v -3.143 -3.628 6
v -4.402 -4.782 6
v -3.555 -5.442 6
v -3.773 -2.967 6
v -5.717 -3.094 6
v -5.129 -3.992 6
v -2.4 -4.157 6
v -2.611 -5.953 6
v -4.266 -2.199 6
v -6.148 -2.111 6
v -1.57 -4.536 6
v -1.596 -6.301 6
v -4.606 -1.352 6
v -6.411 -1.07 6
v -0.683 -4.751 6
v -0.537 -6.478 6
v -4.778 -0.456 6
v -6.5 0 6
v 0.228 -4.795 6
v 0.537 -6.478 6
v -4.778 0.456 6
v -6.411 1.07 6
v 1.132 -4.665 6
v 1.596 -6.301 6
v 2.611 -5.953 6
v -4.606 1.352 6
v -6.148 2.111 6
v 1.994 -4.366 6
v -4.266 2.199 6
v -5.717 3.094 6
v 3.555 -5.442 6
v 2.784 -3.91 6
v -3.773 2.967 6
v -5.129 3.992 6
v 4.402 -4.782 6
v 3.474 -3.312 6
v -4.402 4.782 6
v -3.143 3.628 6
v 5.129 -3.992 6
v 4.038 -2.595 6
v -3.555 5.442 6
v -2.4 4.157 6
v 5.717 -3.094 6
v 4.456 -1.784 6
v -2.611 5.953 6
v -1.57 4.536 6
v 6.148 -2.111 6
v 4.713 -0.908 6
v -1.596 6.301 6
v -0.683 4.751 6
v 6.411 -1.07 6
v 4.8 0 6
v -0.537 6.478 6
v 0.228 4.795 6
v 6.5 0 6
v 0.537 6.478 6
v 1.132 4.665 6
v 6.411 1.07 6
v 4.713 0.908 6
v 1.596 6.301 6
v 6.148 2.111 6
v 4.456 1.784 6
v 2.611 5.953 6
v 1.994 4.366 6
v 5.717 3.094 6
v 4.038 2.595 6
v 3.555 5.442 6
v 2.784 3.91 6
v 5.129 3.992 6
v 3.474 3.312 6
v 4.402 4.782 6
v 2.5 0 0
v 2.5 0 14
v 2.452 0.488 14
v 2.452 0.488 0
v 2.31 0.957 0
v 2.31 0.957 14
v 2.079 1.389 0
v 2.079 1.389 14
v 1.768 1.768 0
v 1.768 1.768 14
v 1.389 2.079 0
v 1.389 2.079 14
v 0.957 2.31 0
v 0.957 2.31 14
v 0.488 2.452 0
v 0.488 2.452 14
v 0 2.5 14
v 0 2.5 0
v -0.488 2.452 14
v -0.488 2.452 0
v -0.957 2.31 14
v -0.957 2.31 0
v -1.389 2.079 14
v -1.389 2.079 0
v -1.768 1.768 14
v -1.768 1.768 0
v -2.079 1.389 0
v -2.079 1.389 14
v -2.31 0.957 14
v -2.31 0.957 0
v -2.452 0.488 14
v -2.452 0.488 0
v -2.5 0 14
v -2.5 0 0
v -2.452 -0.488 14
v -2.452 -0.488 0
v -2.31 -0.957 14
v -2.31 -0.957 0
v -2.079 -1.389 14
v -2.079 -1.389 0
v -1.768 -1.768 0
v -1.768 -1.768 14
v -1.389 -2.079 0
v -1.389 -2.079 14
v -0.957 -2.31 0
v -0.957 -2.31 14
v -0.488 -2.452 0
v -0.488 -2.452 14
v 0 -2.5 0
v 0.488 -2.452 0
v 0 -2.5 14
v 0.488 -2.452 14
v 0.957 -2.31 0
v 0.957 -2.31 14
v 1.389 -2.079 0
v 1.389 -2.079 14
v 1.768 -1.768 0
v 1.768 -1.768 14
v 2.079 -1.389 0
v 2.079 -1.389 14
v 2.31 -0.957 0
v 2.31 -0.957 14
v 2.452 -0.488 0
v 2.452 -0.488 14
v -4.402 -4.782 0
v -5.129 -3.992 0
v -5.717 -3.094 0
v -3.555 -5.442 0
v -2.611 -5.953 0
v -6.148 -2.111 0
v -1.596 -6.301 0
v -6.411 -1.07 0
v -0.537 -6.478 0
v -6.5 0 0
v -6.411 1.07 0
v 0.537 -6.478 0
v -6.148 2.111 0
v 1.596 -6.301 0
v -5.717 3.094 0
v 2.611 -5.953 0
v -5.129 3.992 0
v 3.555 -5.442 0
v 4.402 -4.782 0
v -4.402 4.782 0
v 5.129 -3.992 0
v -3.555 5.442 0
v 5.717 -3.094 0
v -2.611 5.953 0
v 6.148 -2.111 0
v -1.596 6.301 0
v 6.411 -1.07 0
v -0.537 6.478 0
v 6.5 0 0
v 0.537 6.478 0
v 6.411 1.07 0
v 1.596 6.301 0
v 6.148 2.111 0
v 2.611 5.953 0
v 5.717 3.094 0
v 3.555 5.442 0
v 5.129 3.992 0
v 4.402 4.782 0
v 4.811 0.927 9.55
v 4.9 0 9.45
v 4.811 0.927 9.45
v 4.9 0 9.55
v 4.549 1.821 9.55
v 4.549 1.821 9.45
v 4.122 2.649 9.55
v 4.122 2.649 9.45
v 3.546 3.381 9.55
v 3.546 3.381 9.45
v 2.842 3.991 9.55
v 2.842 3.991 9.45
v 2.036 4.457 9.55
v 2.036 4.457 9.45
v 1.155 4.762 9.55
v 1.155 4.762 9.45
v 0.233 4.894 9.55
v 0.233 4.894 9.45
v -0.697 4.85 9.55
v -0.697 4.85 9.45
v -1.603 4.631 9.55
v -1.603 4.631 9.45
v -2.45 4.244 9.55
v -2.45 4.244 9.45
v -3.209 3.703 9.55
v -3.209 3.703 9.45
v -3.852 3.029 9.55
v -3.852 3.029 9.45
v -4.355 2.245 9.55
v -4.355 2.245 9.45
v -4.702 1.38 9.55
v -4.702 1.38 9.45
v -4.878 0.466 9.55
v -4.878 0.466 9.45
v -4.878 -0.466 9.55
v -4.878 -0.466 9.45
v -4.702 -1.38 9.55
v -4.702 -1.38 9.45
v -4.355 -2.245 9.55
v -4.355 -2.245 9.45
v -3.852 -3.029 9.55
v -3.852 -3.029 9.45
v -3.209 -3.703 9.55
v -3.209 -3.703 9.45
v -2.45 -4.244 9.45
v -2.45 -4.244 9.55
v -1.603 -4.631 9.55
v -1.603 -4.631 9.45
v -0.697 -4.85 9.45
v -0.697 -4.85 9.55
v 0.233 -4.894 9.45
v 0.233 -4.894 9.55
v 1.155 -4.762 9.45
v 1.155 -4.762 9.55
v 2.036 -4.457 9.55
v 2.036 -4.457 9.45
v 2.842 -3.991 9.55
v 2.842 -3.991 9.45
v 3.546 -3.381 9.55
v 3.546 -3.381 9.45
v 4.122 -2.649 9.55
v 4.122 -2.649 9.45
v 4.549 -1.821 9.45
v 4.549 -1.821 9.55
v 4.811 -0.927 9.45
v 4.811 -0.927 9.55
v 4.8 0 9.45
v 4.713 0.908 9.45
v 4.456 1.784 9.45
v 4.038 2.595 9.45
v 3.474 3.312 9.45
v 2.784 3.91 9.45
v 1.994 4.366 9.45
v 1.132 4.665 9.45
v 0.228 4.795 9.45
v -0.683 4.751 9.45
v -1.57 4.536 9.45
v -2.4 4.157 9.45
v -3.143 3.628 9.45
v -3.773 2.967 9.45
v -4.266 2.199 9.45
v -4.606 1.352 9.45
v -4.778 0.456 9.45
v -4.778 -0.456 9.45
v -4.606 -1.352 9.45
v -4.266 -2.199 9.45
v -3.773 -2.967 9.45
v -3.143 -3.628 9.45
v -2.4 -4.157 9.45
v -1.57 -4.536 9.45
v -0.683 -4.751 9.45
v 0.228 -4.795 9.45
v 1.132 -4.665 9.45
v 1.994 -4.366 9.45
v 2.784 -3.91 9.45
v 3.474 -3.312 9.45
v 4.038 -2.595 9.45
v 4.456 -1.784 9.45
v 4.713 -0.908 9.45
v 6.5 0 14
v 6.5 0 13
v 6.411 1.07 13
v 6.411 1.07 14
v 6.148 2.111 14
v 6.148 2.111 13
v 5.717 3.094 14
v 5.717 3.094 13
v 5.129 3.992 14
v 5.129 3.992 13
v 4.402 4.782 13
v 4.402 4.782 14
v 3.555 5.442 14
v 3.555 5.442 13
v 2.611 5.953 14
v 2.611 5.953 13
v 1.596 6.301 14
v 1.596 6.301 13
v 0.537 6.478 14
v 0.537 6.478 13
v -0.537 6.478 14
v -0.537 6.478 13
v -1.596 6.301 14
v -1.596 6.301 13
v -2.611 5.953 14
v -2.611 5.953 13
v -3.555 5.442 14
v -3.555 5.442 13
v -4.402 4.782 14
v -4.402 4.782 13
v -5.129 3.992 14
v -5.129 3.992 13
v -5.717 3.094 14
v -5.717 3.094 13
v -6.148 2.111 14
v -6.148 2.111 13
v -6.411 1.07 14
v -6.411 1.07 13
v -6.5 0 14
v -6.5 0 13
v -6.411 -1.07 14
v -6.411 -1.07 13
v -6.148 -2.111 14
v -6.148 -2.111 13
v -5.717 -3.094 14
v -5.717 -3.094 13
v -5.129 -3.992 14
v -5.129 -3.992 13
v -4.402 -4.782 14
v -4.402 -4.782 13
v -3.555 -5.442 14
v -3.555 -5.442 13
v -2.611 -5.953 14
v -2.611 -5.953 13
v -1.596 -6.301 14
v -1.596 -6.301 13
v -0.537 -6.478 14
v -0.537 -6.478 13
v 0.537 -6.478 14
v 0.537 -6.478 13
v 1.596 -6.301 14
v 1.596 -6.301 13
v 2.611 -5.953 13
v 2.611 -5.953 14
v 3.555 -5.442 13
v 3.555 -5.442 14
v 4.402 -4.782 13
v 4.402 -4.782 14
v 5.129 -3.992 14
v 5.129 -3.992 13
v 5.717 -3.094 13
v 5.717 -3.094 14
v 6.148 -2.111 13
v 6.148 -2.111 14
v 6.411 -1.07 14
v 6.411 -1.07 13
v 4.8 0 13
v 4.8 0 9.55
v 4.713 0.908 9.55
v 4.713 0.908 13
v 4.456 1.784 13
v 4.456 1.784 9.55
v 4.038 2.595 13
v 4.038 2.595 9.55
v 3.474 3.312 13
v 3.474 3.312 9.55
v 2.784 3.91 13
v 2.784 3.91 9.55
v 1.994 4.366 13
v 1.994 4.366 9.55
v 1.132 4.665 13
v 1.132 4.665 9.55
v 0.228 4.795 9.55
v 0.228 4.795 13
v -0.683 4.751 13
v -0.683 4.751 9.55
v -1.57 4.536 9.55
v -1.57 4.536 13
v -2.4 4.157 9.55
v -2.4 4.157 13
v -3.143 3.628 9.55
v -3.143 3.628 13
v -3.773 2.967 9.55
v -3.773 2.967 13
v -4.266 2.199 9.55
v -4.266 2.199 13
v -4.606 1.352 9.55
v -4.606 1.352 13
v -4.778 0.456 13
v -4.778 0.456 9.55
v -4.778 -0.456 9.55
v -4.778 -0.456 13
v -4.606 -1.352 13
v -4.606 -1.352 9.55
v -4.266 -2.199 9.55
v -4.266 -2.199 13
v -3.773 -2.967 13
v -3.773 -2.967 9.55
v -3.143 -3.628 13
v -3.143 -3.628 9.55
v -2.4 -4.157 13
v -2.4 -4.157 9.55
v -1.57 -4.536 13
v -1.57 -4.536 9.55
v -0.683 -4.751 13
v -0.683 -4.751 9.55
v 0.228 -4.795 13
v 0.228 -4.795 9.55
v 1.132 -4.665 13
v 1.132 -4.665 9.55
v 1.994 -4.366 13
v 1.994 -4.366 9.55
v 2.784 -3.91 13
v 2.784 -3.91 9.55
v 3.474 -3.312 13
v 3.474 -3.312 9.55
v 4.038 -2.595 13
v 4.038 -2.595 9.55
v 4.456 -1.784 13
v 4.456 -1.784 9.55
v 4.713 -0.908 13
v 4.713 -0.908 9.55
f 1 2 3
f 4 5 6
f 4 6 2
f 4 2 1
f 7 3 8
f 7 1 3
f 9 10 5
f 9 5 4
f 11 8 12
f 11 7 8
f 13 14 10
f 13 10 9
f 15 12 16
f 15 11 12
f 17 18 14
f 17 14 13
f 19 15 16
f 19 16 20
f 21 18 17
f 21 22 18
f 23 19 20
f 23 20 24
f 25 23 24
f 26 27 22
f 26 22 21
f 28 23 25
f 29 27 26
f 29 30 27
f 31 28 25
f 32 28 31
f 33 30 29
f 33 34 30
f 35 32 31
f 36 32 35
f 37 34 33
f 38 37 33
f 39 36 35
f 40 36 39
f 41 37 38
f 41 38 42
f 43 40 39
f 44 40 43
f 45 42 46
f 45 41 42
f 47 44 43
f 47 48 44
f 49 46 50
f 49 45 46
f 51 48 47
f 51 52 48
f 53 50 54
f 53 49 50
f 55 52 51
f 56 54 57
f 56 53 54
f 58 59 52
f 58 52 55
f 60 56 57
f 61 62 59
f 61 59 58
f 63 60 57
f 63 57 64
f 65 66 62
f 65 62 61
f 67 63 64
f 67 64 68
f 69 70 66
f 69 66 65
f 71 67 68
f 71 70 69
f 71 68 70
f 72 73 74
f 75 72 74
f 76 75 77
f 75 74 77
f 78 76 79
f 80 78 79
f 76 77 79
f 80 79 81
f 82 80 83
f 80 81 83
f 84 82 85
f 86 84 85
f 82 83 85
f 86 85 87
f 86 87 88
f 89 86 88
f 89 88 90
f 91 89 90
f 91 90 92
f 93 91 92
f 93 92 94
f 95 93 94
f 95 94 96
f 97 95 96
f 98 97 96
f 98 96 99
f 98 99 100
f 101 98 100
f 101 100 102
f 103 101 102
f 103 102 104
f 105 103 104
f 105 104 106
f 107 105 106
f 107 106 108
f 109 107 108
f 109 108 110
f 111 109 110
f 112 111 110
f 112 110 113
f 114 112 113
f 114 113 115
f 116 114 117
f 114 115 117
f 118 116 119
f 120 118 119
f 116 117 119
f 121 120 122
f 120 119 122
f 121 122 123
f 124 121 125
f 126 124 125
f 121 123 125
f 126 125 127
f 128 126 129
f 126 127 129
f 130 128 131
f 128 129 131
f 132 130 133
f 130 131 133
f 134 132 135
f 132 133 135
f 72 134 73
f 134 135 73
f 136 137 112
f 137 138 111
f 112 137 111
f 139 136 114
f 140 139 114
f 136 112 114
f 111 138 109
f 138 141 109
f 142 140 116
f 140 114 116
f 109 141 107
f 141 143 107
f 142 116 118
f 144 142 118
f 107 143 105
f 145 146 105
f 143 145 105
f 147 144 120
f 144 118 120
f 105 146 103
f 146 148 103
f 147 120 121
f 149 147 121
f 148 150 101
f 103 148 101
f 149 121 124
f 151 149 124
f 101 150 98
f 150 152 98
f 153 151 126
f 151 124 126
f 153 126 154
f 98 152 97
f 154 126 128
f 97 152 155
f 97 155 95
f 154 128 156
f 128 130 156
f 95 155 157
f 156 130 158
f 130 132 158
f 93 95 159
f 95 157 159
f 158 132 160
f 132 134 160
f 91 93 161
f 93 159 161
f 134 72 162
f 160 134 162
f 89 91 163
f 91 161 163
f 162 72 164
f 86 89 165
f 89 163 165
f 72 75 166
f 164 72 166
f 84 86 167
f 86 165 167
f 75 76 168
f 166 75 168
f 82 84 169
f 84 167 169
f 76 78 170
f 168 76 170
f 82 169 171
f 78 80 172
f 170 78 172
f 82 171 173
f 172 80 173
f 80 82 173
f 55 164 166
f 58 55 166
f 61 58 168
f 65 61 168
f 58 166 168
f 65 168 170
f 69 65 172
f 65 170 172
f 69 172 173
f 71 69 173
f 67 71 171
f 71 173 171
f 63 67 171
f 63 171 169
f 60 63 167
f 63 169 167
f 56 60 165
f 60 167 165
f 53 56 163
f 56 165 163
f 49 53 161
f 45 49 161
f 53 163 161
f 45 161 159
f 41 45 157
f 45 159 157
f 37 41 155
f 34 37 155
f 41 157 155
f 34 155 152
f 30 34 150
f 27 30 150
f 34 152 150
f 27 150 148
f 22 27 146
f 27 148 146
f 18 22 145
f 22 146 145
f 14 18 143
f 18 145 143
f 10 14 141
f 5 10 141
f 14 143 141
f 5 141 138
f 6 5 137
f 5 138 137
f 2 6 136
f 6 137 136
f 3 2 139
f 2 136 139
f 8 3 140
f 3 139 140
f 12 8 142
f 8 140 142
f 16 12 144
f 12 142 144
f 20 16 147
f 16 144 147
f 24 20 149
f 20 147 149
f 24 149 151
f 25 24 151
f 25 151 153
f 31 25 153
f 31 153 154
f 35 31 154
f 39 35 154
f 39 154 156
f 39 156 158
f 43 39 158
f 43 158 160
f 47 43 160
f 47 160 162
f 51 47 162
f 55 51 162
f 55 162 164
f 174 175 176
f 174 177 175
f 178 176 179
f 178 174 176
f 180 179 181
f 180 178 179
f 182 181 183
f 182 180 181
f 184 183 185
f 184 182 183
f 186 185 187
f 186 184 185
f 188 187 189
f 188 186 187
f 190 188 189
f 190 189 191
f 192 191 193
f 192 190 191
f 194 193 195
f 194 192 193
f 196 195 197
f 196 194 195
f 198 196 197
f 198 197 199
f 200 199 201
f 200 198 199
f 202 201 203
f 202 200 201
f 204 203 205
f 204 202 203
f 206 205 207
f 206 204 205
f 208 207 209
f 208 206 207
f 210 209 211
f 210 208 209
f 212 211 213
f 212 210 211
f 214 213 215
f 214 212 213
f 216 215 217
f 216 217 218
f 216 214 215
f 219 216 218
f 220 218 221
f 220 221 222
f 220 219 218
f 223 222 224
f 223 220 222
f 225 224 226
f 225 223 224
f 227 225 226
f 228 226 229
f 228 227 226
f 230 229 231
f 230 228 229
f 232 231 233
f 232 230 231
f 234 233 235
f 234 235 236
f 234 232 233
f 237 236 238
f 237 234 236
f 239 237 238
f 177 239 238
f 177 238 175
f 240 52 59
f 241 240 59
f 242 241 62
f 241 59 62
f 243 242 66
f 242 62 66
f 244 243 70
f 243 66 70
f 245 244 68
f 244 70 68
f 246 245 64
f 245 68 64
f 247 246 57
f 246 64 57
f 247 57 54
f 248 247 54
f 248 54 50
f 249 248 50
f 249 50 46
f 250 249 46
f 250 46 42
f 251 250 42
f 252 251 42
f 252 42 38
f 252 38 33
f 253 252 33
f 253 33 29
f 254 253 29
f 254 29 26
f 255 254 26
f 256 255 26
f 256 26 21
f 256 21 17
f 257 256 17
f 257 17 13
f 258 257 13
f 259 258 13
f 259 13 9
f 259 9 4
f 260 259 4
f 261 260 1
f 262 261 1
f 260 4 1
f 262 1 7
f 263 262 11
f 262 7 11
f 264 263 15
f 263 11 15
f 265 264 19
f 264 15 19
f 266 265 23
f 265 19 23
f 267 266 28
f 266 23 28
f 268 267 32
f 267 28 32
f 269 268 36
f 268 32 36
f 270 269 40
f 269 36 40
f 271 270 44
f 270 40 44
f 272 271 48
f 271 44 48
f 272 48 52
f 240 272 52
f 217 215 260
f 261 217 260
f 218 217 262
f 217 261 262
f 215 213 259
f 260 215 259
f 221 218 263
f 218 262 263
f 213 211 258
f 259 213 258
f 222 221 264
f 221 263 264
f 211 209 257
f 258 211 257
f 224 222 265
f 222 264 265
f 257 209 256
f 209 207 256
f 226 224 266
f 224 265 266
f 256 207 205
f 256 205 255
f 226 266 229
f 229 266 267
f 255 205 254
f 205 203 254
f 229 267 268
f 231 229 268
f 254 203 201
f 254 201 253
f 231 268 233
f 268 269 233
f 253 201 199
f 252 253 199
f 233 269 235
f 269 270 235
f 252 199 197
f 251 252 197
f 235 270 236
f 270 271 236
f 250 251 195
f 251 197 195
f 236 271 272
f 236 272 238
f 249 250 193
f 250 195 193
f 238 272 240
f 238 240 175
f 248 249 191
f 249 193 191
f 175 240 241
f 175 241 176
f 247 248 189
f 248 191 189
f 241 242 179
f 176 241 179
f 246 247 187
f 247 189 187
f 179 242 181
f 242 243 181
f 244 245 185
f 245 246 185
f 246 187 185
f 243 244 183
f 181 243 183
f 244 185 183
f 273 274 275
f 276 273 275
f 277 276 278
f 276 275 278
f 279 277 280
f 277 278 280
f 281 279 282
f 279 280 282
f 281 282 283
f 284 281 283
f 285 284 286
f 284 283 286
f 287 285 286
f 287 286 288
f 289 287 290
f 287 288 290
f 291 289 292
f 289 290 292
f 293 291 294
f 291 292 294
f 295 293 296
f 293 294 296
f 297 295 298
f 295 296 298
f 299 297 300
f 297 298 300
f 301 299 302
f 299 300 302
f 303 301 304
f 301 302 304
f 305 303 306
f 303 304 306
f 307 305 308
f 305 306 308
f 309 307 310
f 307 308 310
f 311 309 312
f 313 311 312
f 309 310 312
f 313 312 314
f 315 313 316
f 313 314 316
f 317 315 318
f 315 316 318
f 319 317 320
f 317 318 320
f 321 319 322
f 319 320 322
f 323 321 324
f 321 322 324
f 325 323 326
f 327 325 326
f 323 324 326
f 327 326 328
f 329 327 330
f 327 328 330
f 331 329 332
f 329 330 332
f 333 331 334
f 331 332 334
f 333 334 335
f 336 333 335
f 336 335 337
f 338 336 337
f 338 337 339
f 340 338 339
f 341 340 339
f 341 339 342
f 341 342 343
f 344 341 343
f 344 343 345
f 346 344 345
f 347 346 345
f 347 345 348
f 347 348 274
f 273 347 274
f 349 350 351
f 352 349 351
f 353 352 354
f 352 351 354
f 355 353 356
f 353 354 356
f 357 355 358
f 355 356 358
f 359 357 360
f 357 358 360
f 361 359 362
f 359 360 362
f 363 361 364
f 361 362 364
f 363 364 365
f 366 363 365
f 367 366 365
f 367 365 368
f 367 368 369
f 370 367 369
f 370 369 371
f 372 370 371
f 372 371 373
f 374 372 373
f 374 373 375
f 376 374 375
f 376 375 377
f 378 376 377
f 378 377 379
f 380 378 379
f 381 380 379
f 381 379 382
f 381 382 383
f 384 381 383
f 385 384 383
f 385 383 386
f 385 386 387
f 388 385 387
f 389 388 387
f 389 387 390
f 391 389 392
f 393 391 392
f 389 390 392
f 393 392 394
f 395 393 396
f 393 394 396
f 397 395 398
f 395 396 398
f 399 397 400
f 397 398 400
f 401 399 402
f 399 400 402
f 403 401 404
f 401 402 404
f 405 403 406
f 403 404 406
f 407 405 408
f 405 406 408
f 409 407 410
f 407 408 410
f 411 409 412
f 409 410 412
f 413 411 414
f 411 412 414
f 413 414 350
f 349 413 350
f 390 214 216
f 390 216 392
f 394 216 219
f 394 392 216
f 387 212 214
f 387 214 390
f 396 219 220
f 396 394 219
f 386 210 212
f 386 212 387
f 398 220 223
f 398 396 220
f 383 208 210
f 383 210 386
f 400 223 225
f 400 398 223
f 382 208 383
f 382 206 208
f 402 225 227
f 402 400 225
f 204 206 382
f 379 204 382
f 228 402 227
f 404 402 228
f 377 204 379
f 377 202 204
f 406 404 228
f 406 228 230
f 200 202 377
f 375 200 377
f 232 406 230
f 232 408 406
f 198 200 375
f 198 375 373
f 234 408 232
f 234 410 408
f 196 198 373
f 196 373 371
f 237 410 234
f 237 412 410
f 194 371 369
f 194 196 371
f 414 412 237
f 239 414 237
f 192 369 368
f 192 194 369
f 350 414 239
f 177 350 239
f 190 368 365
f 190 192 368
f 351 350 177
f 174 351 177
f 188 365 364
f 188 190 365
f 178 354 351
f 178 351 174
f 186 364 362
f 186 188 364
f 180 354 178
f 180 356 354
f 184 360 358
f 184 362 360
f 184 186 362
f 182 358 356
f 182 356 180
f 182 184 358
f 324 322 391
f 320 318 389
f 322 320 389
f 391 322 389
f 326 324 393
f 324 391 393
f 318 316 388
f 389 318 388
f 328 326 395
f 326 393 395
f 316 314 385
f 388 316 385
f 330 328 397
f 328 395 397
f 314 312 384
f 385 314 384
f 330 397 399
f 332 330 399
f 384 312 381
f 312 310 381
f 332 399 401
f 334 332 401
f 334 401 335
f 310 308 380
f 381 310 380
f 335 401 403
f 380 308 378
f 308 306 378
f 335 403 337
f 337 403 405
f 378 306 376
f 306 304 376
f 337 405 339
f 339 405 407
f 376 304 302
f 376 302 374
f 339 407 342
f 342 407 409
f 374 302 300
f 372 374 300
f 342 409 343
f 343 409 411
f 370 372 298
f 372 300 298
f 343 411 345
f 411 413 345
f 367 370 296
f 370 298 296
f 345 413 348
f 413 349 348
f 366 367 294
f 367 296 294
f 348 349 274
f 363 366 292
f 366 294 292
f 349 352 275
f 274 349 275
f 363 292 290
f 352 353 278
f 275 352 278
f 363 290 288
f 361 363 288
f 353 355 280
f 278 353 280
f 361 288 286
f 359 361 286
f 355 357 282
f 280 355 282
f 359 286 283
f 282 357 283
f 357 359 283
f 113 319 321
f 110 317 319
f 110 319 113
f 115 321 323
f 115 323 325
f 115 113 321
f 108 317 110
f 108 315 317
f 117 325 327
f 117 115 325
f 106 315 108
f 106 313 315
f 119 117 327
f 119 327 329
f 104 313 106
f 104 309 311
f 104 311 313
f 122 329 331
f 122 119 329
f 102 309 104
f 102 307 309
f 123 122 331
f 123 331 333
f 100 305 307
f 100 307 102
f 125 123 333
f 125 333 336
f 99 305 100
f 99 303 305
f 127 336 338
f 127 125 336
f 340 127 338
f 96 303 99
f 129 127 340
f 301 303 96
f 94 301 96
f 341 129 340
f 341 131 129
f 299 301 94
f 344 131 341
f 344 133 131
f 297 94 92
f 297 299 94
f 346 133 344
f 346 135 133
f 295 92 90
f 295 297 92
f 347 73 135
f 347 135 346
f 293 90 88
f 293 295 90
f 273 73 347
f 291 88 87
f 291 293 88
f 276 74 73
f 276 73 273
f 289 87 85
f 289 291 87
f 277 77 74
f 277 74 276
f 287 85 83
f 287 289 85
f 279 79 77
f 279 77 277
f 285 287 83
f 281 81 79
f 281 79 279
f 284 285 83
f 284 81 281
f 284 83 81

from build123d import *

# Parameters (mm, degrees)
F0_R      = 6.5
F1_DEPTH  = 6
F2_R      = 4.8
F3_DEPTH  = 7
F4_R      = 6.5
F4_R_2    = 4.8
F5_DEPTH  = 1
F6_R      = 2.5
F7_DEPTH  = 14.001
F9_R      = 4.9
F9_R_2    = 4.8
F10_DEPTH = 0.05


with BuildPart() as f1:
    # F0 (on Top) → F1 (new body)
    with BuildSketch(Plane.XY):
        Circle(F0_R)
    extrude(amount=F1_DEPTH)

    # F2 (on face) → F3 (join)
    with BuildSketch(Plane.XY.offset(6)):
        Circle(F2_R)
    extrude(amount=F3_DEPTH)

    # F4 (on face) → F5 (join)
    with BuildSketch(Plane.XY.offset(13)):
        Circle(F4_R)
        Circle(F4_R_2, mode=Mode.SUBTRACT)
        Circle(F4_R_2)
    extrude(amount=F5_DEPTH)

    # F6 (on face) → F7 (cut, through all)
    with BuildSketch(Plane.XY.offset(14)):
        Circle(F6_R)
    extrude(amount=-F7_DEPTH, mode=Mode.SUBTRACT)

    # F9 (on mid) → F10 (join, symmetric)
    with BuildSketch(Plane.XY.offset(9.5)):
        Circle(F9_R)
        Circle(F9_R_2, mode=Mode.SUBTRACT)
    extrude(amount=F10_DEPTH, both=True)


solid = f1.part
